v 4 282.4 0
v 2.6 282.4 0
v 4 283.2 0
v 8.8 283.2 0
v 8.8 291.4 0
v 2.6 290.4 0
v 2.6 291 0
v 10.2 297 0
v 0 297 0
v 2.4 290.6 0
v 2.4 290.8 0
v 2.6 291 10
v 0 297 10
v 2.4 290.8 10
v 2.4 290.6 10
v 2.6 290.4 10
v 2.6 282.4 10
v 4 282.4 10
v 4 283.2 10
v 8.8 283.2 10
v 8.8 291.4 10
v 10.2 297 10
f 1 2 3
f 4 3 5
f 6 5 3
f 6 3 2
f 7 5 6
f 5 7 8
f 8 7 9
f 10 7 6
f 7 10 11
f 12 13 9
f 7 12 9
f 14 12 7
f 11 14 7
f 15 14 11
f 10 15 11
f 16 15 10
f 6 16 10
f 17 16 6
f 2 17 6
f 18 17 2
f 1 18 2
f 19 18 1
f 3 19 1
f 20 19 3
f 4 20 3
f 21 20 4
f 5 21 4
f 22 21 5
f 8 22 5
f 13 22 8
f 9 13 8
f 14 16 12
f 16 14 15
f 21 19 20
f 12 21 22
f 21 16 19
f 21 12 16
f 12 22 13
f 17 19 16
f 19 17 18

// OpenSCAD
// file: extrusion.scad
/*
fn=32;

skin([
	transform(translation([0,0,0]), rounded_rectangle_profile([2,4],fn=fn,r=.5)),
	transform(translation([0,0,2]), rounded_rectangle_profile([2,4],fn=fn,r=.5)),
	transform(translation([0,0,3]), circle_profile(fn=fn,r=0.5)),
	transform(translation([0,0,4]), circle_profile(fn=fn,r=0.5)),
	transform(translation([0,0,4]), circle_profile(fn=fn,r=0.6)),
	transform(translation([0,0,5]), circle_profile(fn=fn,r=0.5)),
	transform(translation([0,0,5]), circle_profile(fn=fn,r=0.6)),
	transform(translation([0,0,6]), circle_profile(fn=fn,r=0.5)),
	transform(translation([0,0,6]), circle_profile(fn=fn,r=0.6)),
	transform(translation([0,0,7]), circle_profile(fn=fn,r=0.5)),
]);


rotate([90,0,0]) 
translate([0,0,3])
difference() {
	skin(morph(
		profile1=rectangle_profile([2,.2]),
		profile2=transform(translation([0,0,3]), circle_profile(fn=64,r=0.5)),
		slices=40)
	);
	
	skin(morph(
		profile1=transform(translation([0,0,-.01]), rectangle_profile([1.9,0.1])),
		profile2=transform(translation([0,0,3.01]), circle_profile(fn=64,r=0.45)),
		slices=40)
	);
}
*/

function circle_profile(r=1,fn=32) = [
	for (i = [0:fn-1]) 
		let(a = i/fn*360) 
			r*[cos(a),sin(a)]
];

function rectangle_profile(size=[1,1]) = [	
	// The first point is the anchor point, put it on the point corresponding to [cos(0),sin(0)]
	[ size[0]/2,  0], 
	[ size[0]/2,  size[1]/2],
	[-size[0]/2,  size[1]/2],
	[-size[0]/2, -size[1]/2],
	[ size[0]/2, -size[1]/2],
];

function rounded_rectangle_profile(size=[1,1],r=1,fn=32) = [
	for (index = [0:fn-1])
		let(a = index/fn*360) 
			r * [cos(a), sin(a)] 
			+ sign_x(index, fn) * [size[0]/2-r,0]
			+ sign_y(index, fn) * [0,size[1]/2-r]
];

function sign_x(i,n) = 
	i < n/4 || i > n-n/4  ?  1 :
	i > n/4 && i < n-n/4  ? -1 :
	0;

function sign_y(i,n) = 
	i > 0 && i < n/2  ?  1 :
	i > n/2 ? -1 :
	0;

// transform the array of points in profile with a given transformation matrix
function transform(transformation, profile) = [
	for(p = profile) project(transform_point(p, transformation))
];

// A translation matrix
function translation(xyz=[0,0,0]) = [[1,0,0,xyz[0]],[0,1,0,xyz[1]],[0,0,1,len(xyz)>=3?xyz[2]:0],[0,0,0,1]];
// etc... (TODO)

function interpolate_profile(profile1, profile2, t) = (1-t) * profile1 + t * profile2;

// Morph two profile
function morph(profile1, profile2, slices=1, fn=0) = morph0(
	augment_profile(make_3d(profile1),max(len(profile1),len(profile2),fn)),
	augment_profile(make_3d(profile2),max(len(profile1),len(profile2),fn)),
	slices
);

function morph0(profile1, profile2, slices=1) = [
	for(index = [0:slices-1])
		interpolate_profile(profile1, profile2, index/(slices-1))
];

// Skin a set of profiles with a polyhedral mesh
module skin(profiles, loop=false /* unimplemented */) {
	P = max_len(profiles);
	N = len(profiles);

	profiles = [ 
		for (p = profiles)
			for (pp = augment_profile(make_3d(p),P))
				pp
	];

	function quad(i,P,o) = [[o+i, o+i+P, o+i%P+P+1], [o+i, o+i%P+P+1, o+i%P+1]];

	function profile_triangles(tindex) = [
		for (index = [0:P-1]) 
			let (qs = quad(index+1, P, P*(tindex-1)-1)) 
				for (q = qs) q
	];

    triangles = [ 
		for(index = [1:N-1])
        	for(t = profile_triangles(index)) 
				t
	];
	
	start_cap = [range([0:P-1])];
	end_cap   = [range([P*N-1 : -1 : P*(N-1)])];

	polyhedron(points=profiles, faces=concat(start_cap, triangles, end_cap));
}




//// Some random generic functions

// Convert between cartesian and homogenous coordinates
function project(x) = subarray(x,end=len(x)-1) / x[len(x)-1];
function unproject(x) = concat(x,1);

// Reverses arr
function reverse(arr) = [for (i = [len(arr)-1:-1:0]) arr[i]];

// Generates an array with n copies of value (default 0)
function dup(value=0,n) = [for (i = [1:n]) value];

// Find the index of the maximum element of arr
function max_element(arr,ma_,ma_i_=-1,i_=0) = i_ >= len(arr) ? ma_i_ :
	i_ == 0 || arr[i_] > ma_ ? max_element(arr,arr[i_],i_,i_+1) : max_element(arr,ma_,ma_i_,i_+1);

// Extract a subarray from index begin (inclusive) to end (exclusive)
function subarray(arr,begin=0,end=-1) = [
	let(end = end < 0 ? len(arr) : end)
		for (i = [begin : 1 : end-1])
			arr[i]
];

// Returns a copy of arr with the element at index i set to x
function set(arr,i,x) = [
	for (i_=[0:len(arr)-1])
		i == i_ ? x : arr[i_]
];

// flatten an array
function flatten(arr) = [ for (vs = arr) for (v = vs) v ];
//// Range functions

// Expand a range into an array, e.g. range([1:5]) = [1,2,3,4,5];
function range(r) = [ for(x=r) x ];

// Augments the profile with steiner points making the total number of vertices n 
function augment_profile(profile, n) = 
	subdivide(profile,insert_extra_vertices_0([profile_lengths(profile),dup(0,len(profile))],n-len(profile))[1]);

// The area of a profile
//function area(p, index_=0) = index_ >= len(p) ? 0 :
function pseudo_centroid(p,index_=0) = index_ >= len(p) ? [0,0,0] :
	p[index_]/len(p) + pseudo_centroid(p,index_+1);


//// Nongeneric helper functions

function profile_distance(p1,p2) = norm(pseudo_centroid(p1) - pseudo_centroid(p2));

function rate(profiles) = [ 
	for (index = [0:len(profiles)-2]) [
		profile_length(profiles[index+1]) - profile_length(profiles[index]), 
     	profile_distance(profiles[index], profiles[index+1])
    ]
];

function profiles_lengths(profiles) = [ for (p = profiles) profile_length(p) ];

function profile_segment_length(profile,i) = norm(profile[(i+1)%len(profile)] - profile[i]);

function profile_lengths(profile) = [ 
	for (i = [0:len(profile)-1])
		profile_segment_length(profile,i)
];

function profile_length(profile,i=0) = i >= len(profile) ? 0 :
	 profile_segment_length(profile, i) + profile_length(profile, i+1);

function expand_profile_vertices(profile,n=32) = len(profile) >= n ? profile : expand_profile_vertices_0(profile,profile_length(profile),n);

function increment(arr,i,x=1) = set(arr,i,arr[i]+x);

function distribute_extra_vertex(lengths_count,ma_=-1) = ma_<0 ? distribute_extra_vertex(lengths_count, max_element(lengths_count[0])) :
	concat([set(lengths_count[0],ma_,lengths_count[0][ma_] * (lengths_count[1][ma_]+1) / (lengths_count[1][ma_]+2))], [increment(lengths_count[1],max_element(lengths_count[0]),1)]);

function insert_extra_vertices_0(lengths_count,n_extra) = n_extra <= 0 ? lengths_count : 
	insert_extra_vertices_0(distribute_extra_vertex(lengths_count),n_extra-1);

function transform_point(p, T) = len(p)+1 < len(T) ? transform_point(concat(p,0),T) : 
                                 len(p)   < len(T) ? transform_point(concat(p,1),T) : 
                                 T * p;

function max_len(arr,index_=0,ma_=0) = index_ >= len(arr) ? ma_ :
	max_len(arr,index_+1,max(ma_,len(arr[index_])));

function interpolate(a,b,subdivisions) = [
	for (index = [0:subdivisions-1])
		let(t = index/subdivisions)
			a*(1-t)+b*t
];

function subdivide(profile,subdivisions) = let (N=len(profile)) [
	for (i = [0:N-1])
		let(n = len(subdivisions)>0 ? subdivisions[i] : subdivisions)
			for (p = interpolate(profile[i],profile[(i+1)%N],n+1))
				p
];

function make_3d_point(p) = len(p) < 3 ? concat(p,0) : p;

function make_3d(arr) = [ for(a = arr) make_3d_point(a) ];
// main file
use <extrusion.scad>;

p0 = [[0.000000, 297.000000],[2.600000, 291.000000],[2.400000, 290.800000],[2.400000, 290.600000],[2.600000, 290.400000],[2.600000, 282.400000],[4.000000, 282.400000],[4.000000, 283.200000],[8.800000, 283.200000],[8.800000, 291.400000],[10.200000, 297.000000]];
//p1 = transform(rotation([90, 0, 0]), p0);

module base() {
	//profil();

	skin([transform(translation([0,0,0]), p0),
		  transform(translation([0,0,10]), p0)
		 ]);

	// skin([
	// 	transform(translation([0, 0,0]), profil()),
	// 	transform(translation([0,10,0]), profil())
	// ]);
	// fn=32;

	// skin([
	// 	transform(translation([0,0,0]), rounded_rectangle_profile([2,4],fn=fn,r=.5)),
	// 	transform(translation([0,0,2]), rounded_rectangle_profile([2,4],fn=fn,r=.5))
	// ]);


}

base();
